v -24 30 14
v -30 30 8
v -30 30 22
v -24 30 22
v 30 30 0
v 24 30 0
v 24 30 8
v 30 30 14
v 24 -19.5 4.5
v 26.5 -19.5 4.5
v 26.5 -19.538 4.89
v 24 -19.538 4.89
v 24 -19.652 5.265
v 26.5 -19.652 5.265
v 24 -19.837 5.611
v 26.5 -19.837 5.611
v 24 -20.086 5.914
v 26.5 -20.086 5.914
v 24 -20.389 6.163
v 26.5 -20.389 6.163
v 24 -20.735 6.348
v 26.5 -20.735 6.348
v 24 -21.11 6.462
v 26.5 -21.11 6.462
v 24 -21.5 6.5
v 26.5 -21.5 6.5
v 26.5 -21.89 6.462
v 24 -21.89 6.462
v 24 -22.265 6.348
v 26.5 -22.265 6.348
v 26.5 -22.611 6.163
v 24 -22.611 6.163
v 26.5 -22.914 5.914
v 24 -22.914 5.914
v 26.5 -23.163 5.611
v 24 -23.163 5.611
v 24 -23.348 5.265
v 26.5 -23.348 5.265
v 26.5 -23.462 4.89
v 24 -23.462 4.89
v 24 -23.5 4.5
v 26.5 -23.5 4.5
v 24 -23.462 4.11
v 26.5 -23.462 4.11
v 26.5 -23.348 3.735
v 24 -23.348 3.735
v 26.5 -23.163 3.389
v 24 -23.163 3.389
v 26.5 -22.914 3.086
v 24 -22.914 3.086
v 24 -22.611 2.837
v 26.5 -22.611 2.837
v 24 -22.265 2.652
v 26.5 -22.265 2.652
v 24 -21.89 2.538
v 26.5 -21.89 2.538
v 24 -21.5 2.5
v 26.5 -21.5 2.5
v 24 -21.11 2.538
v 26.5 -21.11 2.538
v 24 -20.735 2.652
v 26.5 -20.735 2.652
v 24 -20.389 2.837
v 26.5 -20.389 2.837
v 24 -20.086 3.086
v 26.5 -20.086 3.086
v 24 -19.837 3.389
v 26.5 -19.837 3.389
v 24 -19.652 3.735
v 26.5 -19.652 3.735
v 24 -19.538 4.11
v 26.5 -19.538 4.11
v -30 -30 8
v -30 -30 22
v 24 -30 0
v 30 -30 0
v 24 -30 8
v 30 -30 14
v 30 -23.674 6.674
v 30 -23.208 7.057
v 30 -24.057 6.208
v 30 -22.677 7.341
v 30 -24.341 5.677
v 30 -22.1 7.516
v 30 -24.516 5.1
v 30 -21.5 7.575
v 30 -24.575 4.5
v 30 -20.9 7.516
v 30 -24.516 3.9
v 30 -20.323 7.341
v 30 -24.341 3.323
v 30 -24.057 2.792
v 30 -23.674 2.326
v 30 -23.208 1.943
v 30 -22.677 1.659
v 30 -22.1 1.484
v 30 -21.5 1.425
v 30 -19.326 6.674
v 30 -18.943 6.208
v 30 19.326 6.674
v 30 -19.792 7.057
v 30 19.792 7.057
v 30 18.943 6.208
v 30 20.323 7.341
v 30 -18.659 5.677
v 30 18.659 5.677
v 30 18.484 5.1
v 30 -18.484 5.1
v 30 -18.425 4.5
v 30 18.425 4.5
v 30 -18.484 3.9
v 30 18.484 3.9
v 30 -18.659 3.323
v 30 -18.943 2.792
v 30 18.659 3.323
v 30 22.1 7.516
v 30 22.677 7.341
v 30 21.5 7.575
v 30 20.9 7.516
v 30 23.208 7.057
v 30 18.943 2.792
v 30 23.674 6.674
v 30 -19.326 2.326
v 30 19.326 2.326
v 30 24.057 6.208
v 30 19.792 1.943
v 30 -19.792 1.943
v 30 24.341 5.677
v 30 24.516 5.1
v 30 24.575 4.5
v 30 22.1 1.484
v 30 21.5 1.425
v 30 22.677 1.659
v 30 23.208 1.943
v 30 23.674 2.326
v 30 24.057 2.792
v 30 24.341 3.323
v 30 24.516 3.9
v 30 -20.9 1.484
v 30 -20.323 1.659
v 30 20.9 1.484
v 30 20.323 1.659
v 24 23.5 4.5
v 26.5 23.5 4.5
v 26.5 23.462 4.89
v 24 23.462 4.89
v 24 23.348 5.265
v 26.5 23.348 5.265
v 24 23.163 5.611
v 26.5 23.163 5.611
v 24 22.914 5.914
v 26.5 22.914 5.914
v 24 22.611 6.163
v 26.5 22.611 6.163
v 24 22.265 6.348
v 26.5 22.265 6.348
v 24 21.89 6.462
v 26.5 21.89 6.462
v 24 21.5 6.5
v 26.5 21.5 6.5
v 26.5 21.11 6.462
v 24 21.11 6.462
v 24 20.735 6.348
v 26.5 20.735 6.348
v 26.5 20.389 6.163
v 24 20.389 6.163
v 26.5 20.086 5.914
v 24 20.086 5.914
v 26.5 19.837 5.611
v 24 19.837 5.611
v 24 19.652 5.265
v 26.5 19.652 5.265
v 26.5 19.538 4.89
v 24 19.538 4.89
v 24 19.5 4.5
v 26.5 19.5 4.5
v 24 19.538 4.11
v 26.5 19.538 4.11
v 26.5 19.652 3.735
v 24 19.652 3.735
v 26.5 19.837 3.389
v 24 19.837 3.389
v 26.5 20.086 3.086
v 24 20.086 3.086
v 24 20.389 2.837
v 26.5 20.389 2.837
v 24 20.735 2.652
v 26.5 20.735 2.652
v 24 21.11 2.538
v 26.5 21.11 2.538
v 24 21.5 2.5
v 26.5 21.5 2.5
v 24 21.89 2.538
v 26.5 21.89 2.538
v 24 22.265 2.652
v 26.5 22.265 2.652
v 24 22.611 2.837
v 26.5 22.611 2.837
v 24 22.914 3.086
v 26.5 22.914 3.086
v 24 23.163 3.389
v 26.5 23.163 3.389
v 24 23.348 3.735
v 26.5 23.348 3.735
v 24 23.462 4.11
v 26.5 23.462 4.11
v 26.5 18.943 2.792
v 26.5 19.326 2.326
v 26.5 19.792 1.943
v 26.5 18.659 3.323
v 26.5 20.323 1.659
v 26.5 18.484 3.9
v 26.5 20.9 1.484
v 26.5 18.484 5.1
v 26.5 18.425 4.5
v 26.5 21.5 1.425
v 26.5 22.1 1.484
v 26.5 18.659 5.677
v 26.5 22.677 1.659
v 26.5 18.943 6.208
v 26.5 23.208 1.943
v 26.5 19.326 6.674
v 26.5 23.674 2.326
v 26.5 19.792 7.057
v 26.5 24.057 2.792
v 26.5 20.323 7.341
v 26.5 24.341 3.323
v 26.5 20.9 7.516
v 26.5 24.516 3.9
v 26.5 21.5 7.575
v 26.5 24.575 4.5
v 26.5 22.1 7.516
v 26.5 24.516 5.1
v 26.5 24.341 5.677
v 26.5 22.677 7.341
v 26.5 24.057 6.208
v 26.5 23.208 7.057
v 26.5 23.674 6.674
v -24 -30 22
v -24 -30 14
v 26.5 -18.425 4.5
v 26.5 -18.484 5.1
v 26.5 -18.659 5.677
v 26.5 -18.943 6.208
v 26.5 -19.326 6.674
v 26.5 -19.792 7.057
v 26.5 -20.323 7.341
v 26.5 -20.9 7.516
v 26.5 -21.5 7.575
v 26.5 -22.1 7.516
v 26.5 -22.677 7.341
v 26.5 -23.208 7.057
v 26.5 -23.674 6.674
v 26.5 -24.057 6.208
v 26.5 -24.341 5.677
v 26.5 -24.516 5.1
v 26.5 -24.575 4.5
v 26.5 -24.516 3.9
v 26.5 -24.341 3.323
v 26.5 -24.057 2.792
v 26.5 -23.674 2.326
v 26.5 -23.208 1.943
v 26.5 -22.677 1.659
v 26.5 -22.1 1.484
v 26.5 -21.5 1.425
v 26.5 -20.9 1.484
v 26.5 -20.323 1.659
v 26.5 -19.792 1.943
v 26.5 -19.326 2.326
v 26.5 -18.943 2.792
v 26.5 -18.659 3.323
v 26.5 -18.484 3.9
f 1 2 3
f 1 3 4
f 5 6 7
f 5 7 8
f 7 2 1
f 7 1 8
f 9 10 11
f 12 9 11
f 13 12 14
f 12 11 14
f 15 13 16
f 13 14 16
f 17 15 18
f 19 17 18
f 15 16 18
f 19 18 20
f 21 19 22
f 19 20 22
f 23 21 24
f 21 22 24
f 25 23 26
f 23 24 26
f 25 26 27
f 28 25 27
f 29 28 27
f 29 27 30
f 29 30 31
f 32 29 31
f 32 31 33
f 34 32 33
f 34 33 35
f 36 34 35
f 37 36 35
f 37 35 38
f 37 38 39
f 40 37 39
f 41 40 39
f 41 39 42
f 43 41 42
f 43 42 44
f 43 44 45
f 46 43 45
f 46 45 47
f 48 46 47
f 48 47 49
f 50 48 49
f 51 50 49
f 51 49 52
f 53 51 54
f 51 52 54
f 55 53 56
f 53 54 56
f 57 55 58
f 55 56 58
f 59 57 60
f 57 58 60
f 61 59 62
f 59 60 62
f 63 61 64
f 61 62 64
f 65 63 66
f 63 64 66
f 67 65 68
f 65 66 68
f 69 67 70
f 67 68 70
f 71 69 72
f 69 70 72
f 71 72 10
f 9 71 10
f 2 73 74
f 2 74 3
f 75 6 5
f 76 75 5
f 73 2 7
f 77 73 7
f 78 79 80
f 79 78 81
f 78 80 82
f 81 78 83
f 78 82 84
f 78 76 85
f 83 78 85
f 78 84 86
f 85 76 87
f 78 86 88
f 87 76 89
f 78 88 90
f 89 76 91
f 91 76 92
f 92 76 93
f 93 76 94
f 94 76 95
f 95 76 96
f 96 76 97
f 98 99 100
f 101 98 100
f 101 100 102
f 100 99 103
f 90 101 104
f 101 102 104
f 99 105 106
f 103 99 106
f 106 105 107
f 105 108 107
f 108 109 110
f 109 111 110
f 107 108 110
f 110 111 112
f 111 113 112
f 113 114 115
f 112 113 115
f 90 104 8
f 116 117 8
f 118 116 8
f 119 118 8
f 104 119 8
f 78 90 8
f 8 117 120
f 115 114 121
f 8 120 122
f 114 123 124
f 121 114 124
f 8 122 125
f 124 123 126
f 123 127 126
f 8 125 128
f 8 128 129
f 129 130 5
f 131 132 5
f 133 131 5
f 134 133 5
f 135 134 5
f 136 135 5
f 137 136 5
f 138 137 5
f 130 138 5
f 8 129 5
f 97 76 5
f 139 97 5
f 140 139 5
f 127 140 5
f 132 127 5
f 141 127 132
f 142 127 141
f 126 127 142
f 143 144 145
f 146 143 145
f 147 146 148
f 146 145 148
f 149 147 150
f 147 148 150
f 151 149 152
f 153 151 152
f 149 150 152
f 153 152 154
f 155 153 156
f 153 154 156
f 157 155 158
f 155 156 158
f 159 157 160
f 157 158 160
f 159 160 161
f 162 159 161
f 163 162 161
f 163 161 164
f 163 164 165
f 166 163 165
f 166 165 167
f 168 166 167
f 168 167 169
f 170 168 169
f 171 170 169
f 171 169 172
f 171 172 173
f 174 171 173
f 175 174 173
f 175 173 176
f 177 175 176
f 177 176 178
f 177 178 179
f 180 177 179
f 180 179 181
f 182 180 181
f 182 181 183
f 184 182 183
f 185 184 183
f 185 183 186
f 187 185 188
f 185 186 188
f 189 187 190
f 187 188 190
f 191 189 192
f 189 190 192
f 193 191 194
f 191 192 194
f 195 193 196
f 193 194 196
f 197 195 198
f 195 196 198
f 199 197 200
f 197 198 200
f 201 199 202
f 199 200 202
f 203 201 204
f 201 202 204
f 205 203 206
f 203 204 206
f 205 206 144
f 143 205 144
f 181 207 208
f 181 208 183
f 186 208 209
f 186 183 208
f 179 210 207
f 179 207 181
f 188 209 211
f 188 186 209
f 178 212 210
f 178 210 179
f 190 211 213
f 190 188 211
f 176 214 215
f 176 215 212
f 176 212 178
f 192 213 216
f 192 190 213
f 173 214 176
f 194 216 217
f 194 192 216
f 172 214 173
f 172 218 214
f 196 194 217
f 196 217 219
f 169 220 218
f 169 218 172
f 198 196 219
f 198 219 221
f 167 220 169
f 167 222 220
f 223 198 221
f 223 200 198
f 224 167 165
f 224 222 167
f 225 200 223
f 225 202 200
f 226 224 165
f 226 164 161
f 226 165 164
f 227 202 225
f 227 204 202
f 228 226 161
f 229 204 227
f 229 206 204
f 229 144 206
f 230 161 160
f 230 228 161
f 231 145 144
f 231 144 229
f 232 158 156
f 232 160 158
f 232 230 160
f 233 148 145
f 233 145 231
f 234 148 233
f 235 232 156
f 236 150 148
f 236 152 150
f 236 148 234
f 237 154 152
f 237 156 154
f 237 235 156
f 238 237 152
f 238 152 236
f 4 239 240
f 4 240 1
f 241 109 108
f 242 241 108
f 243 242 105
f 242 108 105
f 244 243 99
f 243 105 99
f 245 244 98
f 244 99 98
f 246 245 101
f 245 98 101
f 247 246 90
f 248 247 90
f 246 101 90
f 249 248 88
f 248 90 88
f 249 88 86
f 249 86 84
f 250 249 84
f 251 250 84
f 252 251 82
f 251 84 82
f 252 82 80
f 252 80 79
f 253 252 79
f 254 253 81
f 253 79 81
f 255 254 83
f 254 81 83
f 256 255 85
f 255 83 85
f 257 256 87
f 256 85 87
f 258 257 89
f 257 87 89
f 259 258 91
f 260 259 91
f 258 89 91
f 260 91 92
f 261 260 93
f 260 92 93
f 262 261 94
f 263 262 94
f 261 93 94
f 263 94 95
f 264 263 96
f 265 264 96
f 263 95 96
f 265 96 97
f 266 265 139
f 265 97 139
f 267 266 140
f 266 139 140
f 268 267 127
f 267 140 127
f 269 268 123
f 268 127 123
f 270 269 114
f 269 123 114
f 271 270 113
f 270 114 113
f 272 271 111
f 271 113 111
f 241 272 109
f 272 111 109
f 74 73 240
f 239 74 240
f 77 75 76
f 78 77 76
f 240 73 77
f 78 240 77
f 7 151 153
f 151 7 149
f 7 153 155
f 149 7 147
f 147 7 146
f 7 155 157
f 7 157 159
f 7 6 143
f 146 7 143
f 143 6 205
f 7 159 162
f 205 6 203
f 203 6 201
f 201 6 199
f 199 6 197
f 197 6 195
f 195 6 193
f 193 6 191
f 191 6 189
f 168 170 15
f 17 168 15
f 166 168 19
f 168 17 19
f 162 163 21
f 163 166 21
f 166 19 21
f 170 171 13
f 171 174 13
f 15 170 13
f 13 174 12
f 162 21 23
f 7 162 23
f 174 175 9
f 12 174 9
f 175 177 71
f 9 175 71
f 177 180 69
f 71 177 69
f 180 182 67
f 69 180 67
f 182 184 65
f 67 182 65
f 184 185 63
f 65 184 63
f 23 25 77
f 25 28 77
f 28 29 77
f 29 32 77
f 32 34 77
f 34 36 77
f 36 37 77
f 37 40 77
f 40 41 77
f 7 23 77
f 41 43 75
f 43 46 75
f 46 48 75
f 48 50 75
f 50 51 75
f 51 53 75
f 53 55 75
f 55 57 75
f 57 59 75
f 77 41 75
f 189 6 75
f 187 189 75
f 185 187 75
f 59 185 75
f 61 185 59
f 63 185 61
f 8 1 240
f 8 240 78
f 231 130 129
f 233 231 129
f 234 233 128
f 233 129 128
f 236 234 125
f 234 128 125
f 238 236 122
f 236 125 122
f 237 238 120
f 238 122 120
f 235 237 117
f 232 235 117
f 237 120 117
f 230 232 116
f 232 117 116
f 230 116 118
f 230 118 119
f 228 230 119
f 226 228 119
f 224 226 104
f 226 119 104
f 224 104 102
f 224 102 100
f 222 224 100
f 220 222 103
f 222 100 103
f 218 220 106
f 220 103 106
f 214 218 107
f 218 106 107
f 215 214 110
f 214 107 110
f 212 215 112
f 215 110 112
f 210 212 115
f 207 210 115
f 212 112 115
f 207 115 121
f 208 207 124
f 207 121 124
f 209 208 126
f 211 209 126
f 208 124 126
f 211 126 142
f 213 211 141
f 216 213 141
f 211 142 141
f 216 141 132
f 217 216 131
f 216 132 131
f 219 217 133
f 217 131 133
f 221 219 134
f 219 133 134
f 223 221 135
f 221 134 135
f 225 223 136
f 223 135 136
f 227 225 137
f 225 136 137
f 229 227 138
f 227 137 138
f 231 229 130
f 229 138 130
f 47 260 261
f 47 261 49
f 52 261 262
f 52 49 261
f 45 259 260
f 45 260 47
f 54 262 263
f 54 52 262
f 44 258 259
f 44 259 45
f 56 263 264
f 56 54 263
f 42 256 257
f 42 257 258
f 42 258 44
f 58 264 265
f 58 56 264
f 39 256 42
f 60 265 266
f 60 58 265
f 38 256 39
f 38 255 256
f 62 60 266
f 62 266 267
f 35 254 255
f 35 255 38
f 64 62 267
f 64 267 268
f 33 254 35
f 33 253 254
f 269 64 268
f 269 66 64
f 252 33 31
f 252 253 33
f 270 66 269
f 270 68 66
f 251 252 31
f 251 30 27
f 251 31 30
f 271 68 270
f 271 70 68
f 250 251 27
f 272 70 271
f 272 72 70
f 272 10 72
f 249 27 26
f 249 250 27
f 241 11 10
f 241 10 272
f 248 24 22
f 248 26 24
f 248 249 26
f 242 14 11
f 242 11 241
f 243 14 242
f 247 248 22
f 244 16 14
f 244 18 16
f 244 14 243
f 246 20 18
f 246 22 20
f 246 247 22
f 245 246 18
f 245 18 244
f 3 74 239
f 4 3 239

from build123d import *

# Parameters (mm, degrees)
F0_W     = 60
F0_H     = 60
F1_DEPTH = 22
F2_W     = 65.936946
F2_H     = 73.230896
F3_DEPTH = 8
F4_W     = 66.143565
F4_H     = 69.968968
F5_DEPTH = 8
F6_R     = 2
F7_DEPTH = 8
F8_R     = 3.075
F9_DEPTH = 3.5


with BuildPart() as f1:
    # F0 (on Top) → F1 (new body)
    with BuildSketch(Plane.XY):
        Rectangle(F0_W, F0_H)
    extrude(amount=F1_DEPTH)

    # F2 (on face) → F3 (cut)
    with BuildSketch(Plane.XY.offset(22)):
        with Locations((8.968473, 0)):
            Rectangle(F2_W, F2_H)
    extrude(amount=-F3_DEPTH, mode=Mode.SUBTRACT)

    # F4 (on face) → F5 (cut)
    with BuildSketch(Plane(origin=(0, 0, 0), x_dir=(1, 0, 0), z_dir=(0, 0, -1))):
        with Locations((-9.071782, 0)):
            Rectangle(F4_W, F4_H)
    extrude(amount=-F5_DEPTH, mode=Mode.SUBTRACT)

    # F6 (on face) → F7 (cut)
    with BuildSketch(Plane.YZ.offset(30)):
        with Locations((21.5, 4.5)):
            Circle(F6_R)
        with Locations((-21.5, 4.5)):
            Circle(F6_R)
    extrude(amount=-F7_DEPTH, mode=Mode.SUBTRACT)

    # F8 (on face) → F9 (cut)
    with BuildSketch(Plane.YZ.offset(30)):
        with Locations((-21.5, 4.5)):
            Circle(F8_R)
        with Locations((21.5, 4.5)):
            Circle(F8_R)
    extrude(amount=-F9_DEPTH, mode=Mode.SUBTRACT)


solid = f1.part
